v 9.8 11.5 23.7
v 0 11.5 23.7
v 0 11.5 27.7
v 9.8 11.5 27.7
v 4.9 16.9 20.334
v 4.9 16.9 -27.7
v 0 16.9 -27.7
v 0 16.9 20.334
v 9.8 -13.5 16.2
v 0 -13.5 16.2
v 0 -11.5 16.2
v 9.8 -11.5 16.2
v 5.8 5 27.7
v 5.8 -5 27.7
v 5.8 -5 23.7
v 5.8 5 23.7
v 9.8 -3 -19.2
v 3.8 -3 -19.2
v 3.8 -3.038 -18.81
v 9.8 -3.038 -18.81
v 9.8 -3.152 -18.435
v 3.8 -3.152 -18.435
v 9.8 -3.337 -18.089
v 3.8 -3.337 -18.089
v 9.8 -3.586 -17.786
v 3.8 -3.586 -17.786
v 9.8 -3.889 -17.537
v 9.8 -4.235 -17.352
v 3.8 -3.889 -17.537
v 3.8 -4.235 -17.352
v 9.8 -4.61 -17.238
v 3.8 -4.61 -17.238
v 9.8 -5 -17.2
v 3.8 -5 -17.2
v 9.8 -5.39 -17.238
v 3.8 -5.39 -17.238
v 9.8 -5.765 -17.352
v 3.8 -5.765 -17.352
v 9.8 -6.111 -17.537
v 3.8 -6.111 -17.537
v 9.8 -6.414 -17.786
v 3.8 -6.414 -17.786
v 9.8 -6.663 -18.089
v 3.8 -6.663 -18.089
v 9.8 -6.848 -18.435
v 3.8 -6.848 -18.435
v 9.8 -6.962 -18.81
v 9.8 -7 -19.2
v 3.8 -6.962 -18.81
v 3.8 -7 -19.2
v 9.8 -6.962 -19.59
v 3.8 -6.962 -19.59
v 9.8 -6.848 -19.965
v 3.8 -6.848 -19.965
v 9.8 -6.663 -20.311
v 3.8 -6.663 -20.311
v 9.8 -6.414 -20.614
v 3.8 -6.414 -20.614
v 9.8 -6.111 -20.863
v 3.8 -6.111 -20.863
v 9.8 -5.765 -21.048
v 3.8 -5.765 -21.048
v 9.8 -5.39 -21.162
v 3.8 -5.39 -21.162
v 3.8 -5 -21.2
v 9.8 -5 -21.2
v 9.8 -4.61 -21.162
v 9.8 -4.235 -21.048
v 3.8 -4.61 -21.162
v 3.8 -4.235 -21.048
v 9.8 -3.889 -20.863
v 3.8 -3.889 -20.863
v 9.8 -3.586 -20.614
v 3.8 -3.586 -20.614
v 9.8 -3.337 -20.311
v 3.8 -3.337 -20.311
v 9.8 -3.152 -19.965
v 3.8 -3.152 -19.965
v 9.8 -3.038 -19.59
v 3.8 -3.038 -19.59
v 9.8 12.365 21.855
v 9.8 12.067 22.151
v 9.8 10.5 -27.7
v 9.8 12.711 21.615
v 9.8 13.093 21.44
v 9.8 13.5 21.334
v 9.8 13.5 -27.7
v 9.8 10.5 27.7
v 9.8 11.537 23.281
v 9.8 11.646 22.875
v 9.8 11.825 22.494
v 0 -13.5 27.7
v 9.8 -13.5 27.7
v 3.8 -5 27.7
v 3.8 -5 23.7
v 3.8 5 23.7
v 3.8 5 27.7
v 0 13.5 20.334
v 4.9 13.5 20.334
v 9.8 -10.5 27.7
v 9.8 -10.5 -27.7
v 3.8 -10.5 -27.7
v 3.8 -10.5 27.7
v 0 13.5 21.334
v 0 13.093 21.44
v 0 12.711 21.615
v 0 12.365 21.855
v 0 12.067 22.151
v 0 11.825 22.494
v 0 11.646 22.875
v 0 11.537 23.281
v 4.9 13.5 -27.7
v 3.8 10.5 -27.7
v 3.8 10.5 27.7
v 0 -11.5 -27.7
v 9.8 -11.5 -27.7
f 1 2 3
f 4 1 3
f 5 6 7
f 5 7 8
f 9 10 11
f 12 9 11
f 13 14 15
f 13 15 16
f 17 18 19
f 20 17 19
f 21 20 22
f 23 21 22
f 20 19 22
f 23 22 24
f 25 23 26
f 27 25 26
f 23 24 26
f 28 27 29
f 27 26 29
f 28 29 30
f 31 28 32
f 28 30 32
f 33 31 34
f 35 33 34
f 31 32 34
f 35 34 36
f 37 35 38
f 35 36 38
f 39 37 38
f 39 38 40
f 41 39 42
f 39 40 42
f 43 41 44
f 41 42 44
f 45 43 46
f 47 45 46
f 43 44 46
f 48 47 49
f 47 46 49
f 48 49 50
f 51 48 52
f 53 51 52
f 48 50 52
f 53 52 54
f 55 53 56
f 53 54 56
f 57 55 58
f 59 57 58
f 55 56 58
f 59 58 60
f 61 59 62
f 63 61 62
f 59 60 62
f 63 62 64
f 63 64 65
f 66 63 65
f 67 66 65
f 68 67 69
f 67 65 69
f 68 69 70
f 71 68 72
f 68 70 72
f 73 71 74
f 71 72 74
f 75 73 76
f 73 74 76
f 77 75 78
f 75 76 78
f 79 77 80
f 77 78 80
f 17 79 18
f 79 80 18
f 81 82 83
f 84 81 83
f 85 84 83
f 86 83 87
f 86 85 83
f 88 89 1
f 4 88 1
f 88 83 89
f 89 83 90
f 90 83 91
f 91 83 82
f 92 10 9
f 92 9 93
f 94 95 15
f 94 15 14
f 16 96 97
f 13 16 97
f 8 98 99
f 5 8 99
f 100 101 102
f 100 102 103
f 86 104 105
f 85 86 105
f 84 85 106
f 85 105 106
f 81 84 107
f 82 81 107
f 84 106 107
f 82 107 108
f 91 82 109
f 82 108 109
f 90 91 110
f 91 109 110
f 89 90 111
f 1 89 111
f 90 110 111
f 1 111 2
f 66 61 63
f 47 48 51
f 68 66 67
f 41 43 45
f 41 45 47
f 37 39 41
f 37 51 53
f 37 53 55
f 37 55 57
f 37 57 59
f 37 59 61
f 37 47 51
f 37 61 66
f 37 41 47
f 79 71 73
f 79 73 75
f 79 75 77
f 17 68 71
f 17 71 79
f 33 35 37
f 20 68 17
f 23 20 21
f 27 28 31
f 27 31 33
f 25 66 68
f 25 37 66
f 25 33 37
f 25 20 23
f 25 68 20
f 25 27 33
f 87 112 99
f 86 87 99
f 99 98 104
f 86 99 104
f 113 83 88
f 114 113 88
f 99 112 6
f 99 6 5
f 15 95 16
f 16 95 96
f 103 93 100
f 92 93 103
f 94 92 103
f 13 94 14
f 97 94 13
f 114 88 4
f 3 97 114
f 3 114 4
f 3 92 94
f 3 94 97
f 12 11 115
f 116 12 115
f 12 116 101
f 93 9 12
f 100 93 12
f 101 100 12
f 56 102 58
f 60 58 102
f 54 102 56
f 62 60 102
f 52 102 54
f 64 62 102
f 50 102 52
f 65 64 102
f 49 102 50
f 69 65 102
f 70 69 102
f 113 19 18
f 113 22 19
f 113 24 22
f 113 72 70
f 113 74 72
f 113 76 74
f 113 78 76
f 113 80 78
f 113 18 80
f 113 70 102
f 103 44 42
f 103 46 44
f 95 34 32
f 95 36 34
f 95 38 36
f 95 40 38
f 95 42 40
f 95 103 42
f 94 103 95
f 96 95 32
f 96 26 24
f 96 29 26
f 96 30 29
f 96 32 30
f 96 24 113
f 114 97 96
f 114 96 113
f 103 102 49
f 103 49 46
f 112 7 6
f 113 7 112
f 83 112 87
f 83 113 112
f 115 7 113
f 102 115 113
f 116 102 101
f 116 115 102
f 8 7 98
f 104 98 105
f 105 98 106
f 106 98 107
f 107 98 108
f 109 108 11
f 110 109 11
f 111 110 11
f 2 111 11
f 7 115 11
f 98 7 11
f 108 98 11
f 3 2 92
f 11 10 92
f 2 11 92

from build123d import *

# Parameters (mm, degrees)
SKETCH024_W     = 27
SKETCH024_H     = 55.4
PAD006_DEPTH    = 9.8
SKETCH025_W     = 21
SKETCH025_H     = 55.4
POCKET022_DEPTH = 6
SKETCH026_W     = 10
SKETCH026_H     = 4
PAD007_DEPTH    = 2
SKETCH027_R     = 2
PAD008_DEPTH    = 6
SKETCH028_W     = 2
SKETCH028_H     = 43.9
POCKET023_DEPTH = 9.8
SKETCH029_W     = 48.033568
SKETCH029_H     = 4.9
PAD009_DEPTH    = 3.4


with BuildPart() as part:
    # Sketch024 → Pad006 (new body)
    with BuildSketch(Plane.YZ):
        Rectangle(SKETCH024_W, SKETCH024_H)
    extrude(amount=PAD006_DEPTH)

    # Sketch025 (on Face6 of Pad006) → Pocket022 (cut)
    with BuildSketch(Plane.YZ.offset(9.8)):
        Rectangle(SKETCH025_W, SKETCH025_H)
    extrude(amount=-POCKET022_DEPTH, mode=Mode.SUBTRACT)

    # Sketch026 (on Face6 of Pocket022) → Pad007 (join)
    with BuildSketch(Plane.YZ.offset(3.8)):
        with Locations((0, 25.7)):
            Rectangle(SKETCH026_W, SKETCH026_H)
    extrude(amount=PAD007_DEPTH)

    # Sketch027 (on Face6 of Pad007) → Pad008 (join)
    with BuildSketch(Plane.YZ.offset(3.8)):
        with Locations((-5, -19.2)):
            Circle(SKETCH027_R)
    extrude(amount=PAD008_DEPTH)

    # Sketch028 (on Face2 of Pad008) → Pocket023 (cut)
    with BuildSketch(Plane(origin=(0, 0, 0), x_dir=(0, 1, 0), z_dir=(-1, 0, 0))):
        with Locations((-12.5, 5.75)):
            Rectangle(SKETCH028_W, SKETCH028_H)
        with BuildLine():
            ThreePointArc((13.5, -21.333568), (12.06697, -22.150807), (11.5, -23.7))
            Line((11.5, -23.7), (11.5, -27.7))
            Line((11.5, -27.7), (13.5, -27.7))
            Line((13.5, -27.7), (13.5, -21.333568))
        make_face()
    extrude(amount=-POCKET023_DEPTH, mode=Mode.SUBTRACT)

    # Sketch029 (on Face3 of Pocket023) → Pad009 (join)
    with BuildSketch(Plane.ZX.offset(13.5)):
        with Locations((-3.683216, 2.45)):
            Rectangle(SKETCH029_W, SKETCH029_H)
    extrude(amount=PAD009_DEPTH)


solid = part.part
